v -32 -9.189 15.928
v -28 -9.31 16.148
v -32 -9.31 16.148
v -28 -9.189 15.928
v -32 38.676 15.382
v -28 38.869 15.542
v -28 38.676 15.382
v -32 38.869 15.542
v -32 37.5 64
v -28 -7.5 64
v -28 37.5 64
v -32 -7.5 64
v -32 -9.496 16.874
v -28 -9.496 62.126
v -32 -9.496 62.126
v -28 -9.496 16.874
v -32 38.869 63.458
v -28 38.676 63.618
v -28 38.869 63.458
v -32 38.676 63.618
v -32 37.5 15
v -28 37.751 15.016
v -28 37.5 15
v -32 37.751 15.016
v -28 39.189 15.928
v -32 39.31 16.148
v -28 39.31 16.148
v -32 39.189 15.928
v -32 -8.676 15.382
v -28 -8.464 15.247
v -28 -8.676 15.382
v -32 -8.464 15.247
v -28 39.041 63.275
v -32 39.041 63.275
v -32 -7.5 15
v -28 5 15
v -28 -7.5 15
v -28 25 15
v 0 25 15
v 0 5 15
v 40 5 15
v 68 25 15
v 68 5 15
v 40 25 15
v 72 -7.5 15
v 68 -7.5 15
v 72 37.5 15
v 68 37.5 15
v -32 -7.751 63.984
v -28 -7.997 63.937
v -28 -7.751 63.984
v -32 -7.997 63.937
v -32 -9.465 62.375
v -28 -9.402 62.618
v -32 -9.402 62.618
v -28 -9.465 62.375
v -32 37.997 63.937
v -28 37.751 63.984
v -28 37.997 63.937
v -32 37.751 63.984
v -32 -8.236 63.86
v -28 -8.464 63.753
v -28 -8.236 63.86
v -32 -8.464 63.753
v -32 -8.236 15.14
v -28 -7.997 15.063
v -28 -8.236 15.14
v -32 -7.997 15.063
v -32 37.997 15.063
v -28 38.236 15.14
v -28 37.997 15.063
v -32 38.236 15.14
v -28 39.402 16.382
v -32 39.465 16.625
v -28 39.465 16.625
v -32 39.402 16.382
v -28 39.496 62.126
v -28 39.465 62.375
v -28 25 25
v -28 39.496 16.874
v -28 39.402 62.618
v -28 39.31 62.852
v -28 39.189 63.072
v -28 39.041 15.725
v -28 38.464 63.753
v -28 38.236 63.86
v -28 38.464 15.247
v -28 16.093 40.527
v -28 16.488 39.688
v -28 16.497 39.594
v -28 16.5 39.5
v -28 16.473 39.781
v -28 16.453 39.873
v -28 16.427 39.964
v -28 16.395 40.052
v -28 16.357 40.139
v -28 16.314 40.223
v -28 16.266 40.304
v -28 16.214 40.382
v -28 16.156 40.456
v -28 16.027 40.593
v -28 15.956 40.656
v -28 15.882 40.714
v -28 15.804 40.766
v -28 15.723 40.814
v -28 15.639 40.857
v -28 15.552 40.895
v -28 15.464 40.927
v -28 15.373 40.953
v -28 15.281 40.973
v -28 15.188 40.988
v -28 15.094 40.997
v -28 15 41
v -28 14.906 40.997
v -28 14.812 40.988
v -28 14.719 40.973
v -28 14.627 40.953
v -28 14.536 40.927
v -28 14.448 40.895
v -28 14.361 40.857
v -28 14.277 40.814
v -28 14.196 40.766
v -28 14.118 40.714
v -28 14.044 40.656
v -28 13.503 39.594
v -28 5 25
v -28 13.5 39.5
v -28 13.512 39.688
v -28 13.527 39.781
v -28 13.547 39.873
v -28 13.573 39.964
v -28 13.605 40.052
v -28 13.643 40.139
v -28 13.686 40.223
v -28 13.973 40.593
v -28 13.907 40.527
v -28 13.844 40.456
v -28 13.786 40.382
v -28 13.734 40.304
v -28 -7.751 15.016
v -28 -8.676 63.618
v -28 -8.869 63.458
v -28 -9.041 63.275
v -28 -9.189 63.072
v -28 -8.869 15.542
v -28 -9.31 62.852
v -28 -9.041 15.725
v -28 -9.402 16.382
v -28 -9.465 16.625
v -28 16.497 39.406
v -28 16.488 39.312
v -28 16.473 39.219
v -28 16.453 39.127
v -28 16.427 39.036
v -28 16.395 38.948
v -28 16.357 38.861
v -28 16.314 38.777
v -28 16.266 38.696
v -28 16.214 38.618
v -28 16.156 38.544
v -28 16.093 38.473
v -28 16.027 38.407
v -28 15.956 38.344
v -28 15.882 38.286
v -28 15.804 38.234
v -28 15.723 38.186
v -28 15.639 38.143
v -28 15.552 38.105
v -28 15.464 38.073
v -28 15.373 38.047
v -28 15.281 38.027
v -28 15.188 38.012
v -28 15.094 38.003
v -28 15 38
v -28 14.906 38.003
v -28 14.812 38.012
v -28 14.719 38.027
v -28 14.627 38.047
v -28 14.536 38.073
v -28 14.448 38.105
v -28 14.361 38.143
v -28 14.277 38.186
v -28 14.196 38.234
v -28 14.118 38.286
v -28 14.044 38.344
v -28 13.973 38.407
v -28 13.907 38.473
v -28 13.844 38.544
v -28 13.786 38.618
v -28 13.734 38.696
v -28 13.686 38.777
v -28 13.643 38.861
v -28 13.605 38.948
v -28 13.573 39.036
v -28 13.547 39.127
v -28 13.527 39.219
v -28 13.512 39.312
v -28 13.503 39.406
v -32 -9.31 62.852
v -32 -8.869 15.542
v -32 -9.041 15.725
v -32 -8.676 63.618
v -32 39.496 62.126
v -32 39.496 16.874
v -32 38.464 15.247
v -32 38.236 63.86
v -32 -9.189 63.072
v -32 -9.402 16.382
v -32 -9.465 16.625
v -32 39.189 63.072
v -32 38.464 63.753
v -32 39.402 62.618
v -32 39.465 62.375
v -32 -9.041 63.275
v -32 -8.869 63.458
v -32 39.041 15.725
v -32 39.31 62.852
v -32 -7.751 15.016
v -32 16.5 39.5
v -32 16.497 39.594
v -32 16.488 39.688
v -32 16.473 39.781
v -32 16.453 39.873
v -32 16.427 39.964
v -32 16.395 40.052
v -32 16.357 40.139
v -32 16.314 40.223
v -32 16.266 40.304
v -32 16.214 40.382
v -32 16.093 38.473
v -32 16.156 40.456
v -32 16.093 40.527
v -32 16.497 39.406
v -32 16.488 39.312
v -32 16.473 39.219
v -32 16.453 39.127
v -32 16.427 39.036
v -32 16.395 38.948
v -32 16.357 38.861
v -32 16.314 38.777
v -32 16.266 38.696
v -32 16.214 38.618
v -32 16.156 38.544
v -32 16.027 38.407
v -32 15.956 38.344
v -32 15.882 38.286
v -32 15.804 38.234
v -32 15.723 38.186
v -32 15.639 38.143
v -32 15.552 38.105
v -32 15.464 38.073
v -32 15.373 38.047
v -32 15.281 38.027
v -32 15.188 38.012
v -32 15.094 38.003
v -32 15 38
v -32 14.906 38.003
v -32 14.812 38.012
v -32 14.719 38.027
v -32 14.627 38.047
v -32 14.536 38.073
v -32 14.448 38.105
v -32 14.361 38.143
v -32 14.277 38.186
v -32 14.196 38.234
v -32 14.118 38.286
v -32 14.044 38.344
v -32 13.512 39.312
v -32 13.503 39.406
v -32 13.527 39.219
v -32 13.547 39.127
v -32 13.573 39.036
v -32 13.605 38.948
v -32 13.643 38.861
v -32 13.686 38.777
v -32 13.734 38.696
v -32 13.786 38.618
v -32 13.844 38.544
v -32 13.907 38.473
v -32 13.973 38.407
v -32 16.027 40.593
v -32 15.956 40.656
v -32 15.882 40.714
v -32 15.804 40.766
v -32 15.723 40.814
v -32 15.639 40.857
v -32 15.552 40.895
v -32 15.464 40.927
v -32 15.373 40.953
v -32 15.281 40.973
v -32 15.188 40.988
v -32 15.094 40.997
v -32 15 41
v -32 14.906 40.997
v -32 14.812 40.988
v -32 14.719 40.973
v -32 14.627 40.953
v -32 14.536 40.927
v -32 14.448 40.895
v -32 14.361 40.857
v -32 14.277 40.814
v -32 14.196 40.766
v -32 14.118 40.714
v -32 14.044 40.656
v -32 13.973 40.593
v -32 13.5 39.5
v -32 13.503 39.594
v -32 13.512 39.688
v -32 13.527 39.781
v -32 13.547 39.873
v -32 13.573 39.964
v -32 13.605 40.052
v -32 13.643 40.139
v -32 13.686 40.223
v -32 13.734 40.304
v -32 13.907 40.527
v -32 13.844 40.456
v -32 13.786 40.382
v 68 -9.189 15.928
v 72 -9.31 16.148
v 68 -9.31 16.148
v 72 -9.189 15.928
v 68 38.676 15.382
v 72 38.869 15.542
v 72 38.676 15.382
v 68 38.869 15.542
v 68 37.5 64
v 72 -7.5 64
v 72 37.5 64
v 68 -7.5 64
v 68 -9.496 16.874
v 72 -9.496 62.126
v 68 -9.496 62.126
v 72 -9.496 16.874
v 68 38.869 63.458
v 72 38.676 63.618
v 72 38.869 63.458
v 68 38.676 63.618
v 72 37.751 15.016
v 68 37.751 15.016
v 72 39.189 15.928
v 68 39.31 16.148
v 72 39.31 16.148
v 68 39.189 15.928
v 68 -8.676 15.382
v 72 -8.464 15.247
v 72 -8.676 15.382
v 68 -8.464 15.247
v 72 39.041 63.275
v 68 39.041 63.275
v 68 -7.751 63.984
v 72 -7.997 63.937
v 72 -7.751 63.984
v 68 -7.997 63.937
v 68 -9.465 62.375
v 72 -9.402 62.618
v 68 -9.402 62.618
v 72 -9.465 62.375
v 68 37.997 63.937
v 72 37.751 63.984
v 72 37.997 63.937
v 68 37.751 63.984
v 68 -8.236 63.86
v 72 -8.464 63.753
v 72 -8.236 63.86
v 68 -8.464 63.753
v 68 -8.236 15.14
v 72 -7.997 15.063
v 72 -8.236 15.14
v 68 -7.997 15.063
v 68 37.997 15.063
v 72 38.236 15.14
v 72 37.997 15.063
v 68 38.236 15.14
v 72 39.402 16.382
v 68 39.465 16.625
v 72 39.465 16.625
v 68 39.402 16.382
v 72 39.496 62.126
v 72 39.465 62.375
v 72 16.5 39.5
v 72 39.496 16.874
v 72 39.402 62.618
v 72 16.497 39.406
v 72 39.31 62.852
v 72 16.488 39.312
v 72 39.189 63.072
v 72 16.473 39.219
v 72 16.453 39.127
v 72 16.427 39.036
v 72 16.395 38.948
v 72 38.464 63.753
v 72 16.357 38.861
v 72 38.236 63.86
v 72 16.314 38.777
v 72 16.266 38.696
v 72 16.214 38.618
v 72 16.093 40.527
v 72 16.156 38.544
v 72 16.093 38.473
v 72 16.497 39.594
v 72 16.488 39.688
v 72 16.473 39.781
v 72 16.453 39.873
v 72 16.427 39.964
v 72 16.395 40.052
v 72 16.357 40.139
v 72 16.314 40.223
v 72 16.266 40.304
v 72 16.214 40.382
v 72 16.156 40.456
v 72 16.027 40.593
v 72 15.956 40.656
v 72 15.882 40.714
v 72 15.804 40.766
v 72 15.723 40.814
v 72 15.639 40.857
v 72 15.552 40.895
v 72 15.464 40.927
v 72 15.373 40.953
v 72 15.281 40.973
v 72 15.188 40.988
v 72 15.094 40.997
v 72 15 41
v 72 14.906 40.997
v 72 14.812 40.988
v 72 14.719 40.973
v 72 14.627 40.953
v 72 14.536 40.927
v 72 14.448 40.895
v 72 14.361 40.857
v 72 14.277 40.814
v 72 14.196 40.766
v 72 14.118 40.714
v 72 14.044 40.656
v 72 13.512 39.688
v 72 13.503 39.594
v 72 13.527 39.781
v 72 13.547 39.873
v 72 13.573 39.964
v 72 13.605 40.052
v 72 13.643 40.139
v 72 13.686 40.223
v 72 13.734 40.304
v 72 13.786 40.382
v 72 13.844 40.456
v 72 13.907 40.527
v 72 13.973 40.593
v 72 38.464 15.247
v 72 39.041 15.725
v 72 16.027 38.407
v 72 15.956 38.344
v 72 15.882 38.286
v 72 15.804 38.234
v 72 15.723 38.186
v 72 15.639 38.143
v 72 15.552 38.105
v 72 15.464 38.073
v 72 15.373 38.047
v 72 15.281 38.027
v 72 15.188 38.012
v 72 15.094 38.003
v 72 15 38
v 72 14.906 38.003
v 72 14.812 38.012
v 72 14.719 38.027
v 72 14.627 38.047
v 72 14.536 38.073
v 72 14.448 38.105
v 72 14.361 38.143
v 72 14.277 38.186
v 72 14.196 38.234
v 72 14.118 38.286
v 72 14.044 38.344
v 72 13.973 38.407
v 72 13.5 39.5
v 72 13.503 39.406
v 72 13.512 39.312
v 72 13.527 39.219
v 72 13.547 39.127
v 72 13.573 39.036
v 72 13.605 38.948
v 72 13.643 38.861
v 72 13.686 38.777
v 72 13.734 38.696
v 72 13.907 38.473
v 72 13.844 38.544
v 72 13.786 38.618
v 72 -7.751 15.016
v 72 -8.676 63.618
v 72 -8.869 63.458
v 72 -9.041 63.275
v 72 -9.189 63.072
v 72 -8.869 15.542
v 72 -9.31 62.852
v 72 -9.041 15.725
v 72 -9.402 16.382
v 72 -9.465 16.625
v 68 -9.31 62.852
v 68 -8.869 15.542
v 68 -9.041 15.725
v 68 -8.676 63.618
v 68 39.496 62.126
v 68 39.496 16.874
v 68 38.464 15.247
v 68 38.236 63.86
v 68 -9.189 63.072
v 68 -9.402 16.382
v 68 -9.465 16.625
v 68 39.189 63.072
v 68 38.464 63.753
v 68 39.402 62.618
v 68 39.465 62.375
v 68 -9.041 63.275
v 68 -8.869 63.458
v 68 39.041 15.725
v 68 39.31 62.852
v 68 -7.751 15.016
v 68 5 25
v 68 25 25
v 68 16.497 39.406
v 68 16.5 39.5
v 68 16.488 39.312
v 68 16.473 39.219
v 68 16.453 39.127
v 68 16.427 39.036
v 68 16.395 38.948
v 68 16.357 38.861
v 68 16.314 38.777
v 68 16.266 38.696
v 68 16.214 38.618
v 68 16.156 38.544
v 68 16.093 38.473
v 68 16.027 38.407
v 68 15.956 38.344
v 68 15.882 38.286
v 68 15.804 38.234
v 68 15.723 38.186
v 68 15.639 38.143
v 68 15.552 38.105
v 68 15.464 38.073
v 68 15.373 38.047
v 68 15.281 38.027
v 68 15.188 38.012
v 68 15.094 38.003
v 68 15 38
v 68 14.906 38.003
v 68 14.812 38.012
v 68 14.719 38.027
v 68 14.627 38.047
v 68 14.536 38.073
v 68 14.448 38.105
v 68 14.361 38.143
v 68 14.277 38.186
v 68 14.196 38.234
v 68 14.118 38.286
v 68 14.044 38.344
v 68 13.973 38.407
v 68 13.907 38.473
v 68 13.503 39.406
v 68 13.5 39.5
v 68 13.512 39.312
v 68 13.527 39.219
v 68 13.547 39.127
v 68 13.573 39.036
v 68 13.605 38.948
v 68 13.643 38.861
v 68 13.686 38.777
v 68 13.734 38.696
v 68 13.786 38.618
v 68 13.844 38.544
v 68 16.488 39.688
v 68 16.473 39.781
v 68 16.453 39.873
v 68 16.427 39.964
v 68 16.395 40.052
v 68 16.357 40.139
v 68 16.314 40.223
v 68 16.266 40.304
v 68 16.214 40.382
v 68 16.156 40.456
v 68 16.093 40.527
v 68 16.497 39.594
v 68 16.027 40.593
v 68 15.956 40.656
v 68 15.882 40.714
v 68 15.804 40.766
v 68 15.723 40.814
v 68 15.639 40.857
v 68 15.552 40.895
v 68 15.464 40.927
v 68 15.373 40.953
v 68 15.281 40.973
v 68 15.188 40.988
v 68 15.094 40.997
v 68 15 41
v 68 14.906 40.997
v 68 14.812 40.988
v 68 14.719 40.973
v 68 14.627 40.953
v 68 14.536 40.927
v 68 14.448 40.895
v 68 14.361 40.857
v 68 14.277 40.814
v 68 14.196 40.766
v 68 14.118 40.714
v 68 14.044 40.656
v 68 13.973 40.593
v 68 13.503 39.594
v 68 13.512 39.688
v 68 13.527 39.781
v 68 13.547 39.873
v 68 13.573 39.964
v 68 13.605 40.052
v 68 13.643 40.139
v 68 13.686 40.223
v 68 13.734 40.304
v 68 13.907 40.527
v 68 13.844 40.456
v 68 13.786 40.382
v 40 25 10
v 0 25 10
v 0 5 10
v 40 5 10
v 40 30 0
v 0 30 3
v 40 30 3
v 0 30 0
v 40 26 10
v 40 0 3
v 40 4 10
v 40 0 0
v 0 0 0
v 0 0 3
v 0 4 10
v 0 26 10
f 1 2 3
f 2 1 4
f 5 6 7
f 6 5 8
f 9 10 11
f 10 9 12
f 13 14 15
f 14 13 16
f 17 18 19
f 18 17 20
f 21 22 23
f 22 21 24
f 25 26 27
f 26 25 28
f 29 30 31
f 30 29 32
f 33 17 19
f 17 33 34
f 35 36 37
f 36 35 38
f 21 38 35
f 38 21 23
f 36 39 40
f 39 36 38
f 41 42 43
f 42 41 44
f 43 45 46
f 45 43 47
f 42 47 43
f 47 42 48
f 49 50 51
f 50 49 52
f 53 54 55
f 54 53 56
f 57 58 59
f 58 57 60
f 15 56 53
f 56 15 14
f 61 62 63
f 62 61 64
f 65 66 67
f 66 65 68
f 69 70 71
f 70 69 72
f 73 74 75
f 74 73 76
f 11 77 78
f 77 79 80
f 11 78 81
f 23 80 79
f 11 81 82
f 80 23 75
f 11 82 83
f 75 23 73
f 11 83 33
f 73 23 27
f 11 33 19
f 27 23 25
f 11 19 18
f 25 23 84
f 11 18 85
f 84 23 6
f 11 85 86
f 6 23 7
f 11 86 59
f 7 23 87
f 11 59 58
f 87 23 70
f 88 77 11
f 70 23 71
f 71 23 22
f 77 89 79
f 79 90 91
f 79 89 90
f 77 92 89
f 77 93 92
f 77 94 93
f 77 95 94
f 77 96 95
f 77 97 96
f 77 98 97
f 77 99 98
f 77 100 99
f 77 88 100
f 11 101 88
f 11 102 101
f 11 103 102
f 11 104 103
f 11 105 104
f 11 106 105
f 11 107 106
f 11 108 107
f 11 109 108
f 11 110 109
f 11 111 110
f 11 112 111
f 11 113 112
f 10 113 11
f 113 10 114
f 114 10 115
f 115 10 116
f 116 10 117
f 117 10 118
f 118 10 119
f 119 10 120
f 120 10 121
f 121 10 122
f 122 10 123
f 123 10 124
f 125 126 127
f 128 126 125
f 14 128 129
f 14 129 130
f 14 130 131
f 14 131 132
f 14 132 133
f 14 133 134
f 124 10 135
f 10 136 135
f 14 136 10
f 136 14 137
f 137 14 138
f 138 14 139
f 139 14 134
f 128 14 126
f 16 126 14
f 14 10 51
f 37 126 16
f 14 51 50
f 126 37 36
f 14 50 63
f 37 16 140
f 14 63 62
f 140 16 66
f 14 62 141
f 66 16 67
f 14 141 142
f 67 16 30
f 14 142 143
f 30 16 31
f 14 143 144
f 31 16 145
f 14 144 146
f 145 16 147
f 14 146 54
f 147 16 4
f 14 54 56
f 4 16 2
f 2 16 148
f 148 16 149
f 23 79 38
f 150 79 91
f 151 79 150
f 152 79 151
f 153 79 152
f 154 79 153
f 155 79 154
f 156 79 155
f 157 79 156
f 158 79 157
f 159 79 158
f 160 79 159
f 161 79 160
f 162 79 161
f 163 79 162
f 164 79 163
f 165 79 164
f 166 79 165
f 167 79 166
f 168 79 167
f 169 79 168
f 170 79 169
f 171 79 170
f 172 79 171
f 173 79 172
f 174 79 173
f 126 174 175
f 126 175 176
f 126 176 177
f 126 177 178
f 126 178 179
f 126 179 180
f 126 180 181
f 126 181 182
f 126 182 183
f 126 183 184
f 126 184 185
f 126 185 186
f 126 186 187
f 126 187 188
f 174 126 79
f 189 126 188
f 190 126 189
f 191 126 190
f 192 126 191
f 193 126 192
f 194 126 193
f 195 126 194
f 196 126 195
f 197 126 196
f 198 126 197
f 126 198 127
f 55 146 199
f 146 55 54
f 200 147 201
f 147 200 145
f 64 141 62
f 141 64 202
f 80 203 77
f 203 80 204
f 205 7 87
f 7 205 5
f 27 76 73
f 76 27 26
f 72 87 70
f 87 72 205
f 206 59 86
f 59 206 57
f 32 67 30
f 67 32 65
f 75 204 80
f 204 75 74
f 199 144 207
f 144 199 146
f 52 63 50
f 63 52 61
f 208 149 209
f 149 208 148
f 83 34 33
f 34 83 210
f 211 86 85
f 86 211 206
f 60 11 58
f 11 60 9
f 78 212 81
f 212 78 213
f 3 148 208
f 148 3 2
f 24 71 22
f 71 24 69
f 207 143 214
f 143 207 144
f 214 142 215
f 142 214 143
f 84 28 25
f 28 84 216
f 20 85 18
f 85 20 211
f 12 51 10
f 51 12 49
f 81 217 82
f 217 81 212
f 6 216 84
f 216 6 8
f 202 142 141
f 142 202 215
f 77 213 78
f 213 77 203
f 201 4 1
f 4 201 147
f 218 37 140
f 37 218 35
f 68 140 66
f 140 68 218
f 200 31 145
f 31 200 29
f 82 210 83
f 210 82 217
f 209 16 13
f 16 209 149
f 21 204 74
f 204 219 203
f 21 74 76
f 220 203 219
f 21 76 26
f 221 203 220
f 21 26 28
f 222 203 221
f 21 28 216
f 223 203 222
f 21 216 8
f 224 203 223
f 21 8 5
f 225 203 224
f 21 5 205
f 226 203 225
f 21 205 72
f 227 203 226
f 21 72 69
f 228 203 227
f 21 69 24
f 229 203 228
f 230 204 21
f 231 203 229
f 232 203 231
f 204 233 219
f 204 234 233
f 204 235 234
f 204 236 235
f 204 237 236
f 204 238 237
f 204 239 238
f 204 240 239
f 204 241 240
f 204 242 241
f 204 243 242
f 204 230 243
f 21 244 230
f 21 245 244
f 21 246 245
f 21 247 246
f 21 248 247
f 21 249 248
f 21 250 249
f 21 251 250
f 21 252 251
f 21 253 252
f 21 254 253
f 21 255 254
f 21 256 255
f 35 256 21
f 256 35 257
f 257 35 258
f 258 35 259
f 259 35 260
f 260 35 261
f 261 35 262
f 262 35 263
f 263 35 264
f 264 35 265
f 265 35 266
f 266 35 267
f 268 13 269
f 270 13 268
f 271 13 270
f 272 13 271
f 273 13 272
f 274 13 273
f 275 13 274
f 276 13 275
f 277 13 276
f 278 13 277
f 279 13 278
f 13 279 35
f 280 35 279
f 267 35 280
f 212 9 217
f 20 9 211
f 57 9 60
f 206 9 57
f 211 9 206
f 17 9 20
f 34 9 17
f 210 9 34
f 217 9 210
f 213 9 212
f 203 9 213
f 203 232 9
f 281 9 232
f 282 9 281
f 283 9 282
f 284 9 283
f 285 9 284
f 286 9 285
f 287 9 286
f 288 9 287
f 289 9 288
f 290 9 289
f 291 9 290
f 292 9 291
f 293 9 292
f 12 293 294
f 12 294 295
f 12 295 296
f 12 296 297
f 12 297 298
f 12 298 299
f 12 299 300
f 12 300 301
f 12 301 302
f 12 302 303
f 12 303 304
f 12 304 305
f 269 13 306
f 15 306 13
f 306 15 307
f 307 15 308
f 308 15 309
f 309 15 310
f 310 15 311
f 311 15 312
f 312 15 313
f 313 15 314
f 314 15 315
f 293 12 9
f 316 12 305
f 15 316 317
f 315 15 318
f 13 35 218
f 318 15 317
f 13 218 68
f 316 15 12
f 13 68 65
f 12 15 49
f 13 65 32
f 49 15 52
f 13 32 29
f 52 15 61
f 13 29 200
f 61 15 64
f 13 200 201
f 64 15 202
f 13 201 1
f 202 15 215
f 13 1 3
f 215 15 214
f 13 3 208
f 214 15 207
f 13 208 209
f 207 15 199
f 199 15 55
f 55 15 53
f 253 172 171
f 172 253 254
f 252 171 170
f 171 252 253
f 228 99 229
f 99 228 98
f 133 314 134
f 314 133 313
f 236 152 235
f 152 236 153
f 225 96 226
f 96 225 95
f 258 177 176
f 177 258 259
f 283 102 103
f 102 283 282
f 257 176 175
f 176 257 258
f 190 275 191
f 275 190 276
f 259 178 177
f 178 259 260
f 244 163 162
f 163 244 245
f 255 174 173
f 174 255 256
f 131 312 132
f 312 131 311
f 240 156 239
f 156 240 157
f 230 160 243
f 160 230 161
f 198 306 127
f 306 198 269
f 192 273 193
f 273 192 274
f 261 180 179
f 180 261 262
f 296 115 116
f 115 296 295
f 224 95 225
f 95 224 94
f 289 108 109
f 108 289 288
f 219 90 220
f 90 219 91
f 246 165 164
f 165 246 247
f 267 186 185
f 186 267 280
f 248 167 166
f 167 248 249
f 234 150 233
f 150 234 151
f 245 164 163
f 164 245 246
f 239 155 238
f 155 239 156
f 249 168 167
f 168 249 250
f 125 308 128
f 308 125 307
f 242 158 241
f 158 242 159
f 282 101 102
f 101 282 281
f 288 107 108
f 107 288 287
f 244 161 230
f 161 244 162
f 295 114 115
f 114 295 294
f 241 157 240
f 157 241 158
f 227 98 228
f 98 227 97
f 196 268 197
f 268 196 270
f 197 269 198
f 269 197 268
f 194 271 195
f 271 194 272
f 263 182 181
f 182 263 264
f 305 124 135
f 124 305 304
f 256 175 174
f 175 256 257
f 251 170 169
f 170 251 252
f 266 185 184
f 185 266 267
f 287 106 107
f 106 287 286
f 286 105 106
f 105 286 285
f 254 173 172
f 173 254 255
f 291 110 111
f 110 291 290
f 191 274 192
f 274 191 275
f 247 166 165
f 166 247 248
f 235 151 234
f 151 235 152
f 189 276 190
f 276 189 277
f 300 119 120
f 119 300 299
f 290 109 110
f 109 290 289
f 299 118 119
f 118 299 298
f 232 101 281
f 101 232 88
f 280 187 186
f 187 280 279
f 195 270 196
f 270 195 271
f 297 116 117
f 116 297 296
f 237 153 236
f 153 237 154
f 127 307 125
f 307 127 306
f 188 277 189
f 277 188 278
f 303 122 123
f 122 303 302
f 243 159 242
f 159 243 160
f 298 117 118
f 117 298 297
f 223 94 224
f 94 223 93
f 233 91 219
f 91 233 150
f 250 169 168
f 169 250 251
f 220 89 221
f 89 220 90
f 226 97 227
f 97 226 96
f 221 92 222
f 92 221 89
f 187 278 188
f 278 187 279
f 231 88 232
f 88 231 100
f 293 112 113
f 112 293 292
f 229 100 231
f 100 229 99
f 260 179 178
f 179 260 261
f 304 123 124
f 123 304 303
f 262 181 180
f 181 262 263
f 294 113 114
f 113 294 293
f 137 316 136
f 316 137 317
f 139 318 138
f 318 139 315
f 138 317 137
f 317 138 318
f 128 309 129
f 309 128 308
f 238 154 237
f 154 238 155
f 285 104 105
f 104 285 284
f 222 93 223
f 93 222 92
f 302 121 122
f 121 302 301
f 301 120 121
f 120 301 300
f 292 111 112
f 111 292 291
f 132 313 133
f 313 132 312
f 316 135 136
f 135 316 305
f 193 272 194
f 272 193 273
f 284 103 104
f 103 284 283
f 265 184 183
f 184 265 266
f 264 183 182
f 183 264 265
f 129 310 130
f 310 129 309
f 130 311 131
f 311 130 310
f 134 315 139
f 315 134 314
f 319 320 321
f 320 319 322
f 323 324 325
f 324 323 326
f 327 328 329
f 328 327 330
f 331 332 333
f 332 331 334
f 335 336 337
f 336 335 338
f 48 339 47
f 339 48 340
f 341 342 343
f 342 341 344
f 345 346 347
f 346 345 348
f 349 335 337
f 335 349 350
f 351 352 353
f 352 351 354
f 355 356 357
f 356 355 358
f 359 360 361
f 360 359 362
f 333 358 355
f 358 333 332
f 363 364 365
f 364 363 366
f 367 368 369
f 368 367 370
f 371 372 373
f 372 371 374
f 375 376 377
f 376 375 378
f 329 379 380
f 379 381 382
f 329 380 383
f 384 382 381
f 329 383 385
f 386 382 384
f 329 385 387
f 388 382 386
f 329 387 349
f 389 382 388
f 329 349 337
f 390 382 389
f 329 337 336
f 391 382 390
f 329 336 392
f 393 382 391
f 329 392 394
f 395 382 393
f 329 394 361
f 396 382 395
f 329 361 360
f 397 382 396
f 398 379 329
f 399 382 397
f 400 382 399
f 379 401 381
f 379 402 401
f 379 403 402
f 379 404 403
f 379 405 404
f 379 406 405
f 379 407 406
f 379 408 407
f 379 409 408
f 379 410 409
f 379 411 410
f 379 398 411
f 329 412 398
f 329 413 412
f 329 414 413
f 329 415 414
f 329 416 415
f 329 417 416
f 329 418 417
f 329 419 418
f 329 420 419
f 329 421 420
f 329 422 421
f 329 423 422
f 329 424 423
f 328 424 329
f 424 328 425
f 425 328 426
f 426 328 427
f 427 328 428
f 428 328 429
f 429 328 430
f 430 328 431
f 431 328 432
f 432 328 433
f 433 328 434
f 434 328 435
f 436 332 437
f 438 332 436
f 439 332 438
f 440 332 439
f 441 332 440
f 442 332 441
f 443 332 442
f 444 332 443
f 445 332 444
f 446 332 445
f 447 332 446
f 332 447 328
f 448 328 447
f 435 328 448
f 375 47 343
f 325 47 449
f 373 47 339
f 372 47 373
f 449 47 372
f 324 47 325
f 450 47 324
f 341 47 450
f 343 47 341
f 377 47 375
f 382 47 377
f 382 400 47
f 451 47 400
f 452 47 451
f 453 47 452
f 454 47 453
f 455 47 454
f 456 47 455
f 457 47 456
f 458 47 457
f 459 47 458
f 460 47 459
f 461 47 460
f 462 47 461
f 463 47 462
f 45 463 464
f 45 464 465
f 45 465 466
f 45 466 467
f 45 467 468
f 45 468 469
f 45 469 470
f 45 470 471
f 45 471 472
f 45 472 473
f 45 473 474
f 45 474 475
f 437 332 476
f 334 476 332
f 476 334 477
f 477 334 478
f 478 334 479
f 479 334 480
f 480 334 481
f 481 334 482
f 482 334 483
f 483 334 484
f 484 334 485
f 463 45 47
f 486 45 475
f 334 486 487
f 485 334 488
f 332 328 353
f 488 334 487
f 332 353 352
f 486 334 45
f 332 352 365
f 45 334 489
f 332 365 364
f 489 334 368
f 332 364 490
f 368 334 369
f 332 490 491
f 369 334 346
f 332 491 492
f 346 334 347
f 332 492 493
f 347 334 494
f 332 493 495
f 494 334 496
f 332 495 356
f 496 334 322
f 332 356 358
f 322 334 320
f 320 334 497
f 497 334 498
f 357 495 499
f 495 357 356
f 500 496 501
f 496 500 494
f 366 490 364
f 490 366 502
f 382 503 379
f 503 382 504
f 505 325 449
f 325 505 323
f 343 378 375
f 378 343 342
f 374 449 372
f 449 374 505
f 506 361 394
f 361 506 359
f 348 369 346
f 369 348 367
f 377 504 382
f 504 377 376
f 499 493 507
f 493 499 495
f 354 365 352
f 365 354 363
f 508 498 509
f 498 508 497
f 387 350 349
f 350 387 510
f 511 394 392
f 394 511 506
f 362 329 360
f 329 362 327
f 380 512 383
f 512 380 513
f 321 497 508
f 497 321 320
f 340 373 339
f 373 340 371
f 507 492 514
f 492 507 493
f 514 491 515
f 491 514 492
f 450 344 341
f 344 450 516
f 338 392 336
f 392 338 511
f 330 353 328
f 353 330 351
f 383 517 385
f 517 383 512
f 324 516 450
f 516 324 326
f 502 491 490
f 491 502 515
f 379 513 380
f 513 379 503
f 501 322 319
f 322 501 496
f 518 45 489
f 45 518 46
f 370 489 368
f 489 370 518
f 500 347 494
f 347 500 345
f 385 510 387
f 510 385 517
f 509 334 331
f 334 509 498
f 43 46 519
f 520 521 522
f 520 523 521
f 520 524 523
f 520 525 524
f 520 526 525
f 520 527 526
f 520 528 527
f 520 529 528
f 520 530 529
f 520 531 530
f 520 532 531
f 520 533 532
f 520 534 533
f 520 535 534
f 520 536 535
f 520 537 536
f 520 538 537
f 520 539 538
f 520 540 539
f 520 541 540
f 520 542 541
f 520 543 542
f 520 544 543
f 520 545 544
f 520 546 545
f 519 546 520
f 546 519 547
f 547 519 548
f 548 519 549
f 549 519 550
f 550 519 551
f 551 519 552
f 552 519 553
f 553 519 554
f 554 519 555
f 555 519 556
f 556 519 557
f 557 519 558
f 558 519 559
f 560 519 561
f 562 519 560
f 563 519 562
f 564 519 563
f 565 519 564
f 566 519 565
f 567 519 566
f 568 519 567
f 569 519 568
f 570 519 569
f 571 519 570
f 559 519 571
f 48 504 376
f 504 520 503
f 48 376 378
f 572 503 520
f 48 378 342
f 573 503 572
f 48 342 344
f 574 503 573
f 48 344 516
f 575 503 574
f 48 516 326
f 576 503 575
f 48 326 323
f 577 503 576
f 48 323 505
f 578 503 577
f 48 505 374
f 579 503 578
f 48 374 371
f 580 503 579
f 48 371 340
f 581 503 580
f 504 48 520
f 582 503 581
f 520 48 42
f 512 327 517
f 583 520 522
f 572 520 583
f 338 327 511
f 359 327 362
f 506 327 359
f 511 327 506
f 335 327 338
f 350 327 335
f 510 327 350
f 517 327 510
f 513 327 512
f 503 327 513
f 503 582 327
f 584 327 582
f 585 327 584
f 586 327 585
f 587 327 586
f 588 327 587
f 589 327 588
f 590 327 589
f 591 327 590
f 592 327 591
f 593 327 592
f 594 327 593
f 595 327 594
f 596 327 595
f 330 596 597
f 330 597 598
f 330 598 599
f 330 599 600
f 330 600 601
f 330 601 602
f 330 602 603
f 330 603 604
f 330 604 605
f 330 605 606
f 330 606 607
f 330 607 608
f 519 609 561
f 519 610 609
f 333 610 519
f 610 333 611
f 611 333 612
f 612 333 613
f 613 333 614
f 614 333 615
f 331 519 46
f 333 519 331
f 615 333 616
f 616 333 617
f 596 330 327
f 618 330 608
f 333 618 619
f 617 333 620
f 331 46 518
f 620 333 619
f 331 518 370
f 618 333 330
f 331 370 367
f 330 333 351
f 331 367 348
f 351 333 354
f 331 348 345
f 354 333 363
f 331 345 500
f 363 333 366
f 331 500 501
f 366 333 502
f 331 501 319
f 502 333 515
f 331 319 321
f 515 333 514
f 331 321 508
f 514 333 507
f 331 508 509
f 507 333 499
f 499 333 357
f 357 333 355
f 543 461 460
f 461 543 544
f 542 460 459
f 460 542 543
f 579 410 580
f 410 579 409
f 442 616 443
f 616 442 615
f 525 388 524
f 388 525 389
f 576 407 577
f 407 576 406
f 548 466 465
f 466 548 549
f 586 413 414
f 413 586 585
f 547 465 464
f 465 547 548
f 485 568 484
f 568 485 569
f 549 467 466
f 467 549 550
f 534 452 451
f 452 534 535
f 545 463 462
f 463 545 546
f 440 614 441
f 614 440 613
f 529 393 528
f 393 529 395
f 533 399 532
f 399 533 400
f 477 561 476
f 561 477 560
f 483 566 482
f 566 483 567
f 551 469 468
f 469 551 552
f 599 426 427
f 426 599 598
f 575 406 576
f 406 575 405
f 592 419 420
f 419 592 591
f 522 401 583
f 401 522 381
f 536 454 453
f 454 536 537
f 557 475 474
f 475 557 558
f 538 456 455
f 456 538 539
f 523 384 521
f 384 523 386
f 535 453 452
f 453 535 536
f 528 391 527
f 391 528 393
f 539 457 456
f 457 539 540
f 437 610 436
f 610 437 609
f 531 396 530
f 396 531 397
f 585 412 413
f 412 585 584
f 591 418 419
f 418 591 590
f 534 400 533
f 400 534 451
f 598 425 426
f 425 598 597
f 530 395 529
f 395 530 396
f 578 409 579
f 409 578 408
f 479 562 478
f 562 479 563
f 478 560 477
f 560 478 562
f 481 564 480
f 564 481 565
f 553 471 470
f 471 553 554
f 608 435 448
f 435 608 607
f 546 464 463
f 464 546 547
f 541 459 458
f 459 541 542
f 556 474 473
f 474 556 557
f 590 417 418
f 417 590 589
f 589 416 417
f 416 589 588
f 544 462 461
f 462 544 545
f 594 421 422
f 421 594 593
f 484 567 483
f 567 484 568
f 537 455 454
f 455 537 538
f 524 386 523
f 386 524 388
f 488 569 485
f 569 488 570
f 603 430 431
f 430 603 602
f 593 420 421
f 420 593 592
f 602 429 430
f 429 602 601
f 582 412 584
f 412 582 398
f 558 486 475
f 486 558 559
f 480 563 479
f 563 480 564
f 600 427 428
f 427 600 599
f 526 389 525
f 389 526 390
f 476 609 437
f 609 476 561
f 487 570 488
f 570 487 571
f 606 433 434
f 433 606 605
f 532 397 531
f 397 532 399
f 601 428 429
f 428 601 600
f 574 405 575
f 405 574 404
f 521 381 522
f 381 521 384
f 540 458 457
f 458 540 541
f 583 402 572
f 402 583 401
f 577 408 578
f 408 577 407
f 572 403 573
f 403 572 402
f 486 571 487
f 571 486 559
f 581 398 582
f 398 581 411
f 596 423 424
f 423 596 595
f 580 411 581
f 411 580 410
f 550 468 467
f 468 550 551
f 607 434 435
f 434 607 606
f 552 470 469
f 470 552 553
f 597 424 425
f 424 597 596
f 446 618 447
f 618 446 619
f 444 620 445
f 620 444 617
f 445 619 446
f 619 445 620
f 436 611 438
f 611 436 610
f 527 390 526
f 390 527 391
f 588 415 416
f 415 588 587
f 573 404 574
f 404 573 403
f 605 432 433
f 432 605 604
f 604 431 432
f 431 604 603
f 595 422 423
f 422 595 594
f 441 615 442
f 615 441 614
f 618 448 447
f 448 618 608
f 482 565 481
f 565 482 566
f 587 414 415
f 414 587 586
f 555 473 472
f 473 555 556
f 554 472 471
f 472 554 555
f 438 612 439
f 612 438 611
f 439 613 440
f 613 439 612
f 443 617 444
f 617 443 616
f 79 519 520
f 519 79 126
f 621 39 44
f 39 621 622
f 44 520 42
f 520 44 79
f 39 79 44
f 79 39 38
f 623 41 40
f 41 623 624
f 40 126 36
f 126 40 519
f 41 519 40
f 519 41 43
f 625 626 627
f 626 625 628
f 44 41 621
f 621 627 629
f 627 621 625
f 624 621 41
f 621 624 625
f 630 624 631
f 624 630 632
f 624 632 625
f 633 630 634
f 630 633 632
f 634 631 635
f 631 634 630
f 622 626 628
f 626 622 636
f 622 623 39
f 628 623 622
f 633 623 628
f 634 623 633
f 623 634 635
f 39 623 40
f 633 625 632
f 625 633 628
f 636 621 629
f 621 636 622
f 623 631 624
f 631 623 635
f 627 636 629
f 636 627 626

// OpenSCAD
module aronde(longueur,h1,h_tot,largeur_base,largeur_haut)
{
hauteur_base_1=h1;
hauteur_base_2=h_tot;

dy=(largeur_base-largeur_haut)*0.5;

rotate([90,0,90])
linear_extrude(height=longueur)
{
polygon(points = [[0,0],[largeur_base,0],
                  [largeur_base,hauteur_base_1],
                   [largeur_base-dy,hauteur_base_2],
                  [dy,hauteur_base_2],[0,hauteur_base_1]]);
}
}


module bout(taille,ep,diam)
{
  r=2;
  translate([0,-taille/2,r])
  difference()
  {
    translate([0,0,0])
    rotate([0,-90,0])
    minkowski()
    {
      cube([taille,taille,ep],$color="blue");
      cylinder(h=ep,r=r,$fn=50);
    }
    translate([-50,taille/2,taille/2])
    rotate([0,90,0])
    cylinder(h=100,d=diam,$fn=100);
  }
}

// queue d'aronde
h_aronde=10;
L_aronde=40;
largueur_aronde=30;
aronde(L_aronde,3,h_aronde,largueur_aronde,22);

taille=45;
ep=2;
diam=3;
l_tot=100;
longueur_barre = l_tot-2*ep;
largeur_barre=20;

h_rehausse=5;

dx=-(longueur_barre-L_aronde)/2;
dy=(largueur_aronde-largeur_barre)/2;

translate([0,dy,h_aronde])  
cube([L_aronde,largeur_barre,h_rehausse]);
translate([dx,dy,h_aronde+h_rehausse])
{
  cube([longueur_barre,largeur_barre,10]);
  translate([0,largeur_barre/2,0])
  bout(taille,ep,diam);
  translate([longueur_barre+2*ep,largeur_barre/2,0])
  bout(taille,ep,diam);
}
